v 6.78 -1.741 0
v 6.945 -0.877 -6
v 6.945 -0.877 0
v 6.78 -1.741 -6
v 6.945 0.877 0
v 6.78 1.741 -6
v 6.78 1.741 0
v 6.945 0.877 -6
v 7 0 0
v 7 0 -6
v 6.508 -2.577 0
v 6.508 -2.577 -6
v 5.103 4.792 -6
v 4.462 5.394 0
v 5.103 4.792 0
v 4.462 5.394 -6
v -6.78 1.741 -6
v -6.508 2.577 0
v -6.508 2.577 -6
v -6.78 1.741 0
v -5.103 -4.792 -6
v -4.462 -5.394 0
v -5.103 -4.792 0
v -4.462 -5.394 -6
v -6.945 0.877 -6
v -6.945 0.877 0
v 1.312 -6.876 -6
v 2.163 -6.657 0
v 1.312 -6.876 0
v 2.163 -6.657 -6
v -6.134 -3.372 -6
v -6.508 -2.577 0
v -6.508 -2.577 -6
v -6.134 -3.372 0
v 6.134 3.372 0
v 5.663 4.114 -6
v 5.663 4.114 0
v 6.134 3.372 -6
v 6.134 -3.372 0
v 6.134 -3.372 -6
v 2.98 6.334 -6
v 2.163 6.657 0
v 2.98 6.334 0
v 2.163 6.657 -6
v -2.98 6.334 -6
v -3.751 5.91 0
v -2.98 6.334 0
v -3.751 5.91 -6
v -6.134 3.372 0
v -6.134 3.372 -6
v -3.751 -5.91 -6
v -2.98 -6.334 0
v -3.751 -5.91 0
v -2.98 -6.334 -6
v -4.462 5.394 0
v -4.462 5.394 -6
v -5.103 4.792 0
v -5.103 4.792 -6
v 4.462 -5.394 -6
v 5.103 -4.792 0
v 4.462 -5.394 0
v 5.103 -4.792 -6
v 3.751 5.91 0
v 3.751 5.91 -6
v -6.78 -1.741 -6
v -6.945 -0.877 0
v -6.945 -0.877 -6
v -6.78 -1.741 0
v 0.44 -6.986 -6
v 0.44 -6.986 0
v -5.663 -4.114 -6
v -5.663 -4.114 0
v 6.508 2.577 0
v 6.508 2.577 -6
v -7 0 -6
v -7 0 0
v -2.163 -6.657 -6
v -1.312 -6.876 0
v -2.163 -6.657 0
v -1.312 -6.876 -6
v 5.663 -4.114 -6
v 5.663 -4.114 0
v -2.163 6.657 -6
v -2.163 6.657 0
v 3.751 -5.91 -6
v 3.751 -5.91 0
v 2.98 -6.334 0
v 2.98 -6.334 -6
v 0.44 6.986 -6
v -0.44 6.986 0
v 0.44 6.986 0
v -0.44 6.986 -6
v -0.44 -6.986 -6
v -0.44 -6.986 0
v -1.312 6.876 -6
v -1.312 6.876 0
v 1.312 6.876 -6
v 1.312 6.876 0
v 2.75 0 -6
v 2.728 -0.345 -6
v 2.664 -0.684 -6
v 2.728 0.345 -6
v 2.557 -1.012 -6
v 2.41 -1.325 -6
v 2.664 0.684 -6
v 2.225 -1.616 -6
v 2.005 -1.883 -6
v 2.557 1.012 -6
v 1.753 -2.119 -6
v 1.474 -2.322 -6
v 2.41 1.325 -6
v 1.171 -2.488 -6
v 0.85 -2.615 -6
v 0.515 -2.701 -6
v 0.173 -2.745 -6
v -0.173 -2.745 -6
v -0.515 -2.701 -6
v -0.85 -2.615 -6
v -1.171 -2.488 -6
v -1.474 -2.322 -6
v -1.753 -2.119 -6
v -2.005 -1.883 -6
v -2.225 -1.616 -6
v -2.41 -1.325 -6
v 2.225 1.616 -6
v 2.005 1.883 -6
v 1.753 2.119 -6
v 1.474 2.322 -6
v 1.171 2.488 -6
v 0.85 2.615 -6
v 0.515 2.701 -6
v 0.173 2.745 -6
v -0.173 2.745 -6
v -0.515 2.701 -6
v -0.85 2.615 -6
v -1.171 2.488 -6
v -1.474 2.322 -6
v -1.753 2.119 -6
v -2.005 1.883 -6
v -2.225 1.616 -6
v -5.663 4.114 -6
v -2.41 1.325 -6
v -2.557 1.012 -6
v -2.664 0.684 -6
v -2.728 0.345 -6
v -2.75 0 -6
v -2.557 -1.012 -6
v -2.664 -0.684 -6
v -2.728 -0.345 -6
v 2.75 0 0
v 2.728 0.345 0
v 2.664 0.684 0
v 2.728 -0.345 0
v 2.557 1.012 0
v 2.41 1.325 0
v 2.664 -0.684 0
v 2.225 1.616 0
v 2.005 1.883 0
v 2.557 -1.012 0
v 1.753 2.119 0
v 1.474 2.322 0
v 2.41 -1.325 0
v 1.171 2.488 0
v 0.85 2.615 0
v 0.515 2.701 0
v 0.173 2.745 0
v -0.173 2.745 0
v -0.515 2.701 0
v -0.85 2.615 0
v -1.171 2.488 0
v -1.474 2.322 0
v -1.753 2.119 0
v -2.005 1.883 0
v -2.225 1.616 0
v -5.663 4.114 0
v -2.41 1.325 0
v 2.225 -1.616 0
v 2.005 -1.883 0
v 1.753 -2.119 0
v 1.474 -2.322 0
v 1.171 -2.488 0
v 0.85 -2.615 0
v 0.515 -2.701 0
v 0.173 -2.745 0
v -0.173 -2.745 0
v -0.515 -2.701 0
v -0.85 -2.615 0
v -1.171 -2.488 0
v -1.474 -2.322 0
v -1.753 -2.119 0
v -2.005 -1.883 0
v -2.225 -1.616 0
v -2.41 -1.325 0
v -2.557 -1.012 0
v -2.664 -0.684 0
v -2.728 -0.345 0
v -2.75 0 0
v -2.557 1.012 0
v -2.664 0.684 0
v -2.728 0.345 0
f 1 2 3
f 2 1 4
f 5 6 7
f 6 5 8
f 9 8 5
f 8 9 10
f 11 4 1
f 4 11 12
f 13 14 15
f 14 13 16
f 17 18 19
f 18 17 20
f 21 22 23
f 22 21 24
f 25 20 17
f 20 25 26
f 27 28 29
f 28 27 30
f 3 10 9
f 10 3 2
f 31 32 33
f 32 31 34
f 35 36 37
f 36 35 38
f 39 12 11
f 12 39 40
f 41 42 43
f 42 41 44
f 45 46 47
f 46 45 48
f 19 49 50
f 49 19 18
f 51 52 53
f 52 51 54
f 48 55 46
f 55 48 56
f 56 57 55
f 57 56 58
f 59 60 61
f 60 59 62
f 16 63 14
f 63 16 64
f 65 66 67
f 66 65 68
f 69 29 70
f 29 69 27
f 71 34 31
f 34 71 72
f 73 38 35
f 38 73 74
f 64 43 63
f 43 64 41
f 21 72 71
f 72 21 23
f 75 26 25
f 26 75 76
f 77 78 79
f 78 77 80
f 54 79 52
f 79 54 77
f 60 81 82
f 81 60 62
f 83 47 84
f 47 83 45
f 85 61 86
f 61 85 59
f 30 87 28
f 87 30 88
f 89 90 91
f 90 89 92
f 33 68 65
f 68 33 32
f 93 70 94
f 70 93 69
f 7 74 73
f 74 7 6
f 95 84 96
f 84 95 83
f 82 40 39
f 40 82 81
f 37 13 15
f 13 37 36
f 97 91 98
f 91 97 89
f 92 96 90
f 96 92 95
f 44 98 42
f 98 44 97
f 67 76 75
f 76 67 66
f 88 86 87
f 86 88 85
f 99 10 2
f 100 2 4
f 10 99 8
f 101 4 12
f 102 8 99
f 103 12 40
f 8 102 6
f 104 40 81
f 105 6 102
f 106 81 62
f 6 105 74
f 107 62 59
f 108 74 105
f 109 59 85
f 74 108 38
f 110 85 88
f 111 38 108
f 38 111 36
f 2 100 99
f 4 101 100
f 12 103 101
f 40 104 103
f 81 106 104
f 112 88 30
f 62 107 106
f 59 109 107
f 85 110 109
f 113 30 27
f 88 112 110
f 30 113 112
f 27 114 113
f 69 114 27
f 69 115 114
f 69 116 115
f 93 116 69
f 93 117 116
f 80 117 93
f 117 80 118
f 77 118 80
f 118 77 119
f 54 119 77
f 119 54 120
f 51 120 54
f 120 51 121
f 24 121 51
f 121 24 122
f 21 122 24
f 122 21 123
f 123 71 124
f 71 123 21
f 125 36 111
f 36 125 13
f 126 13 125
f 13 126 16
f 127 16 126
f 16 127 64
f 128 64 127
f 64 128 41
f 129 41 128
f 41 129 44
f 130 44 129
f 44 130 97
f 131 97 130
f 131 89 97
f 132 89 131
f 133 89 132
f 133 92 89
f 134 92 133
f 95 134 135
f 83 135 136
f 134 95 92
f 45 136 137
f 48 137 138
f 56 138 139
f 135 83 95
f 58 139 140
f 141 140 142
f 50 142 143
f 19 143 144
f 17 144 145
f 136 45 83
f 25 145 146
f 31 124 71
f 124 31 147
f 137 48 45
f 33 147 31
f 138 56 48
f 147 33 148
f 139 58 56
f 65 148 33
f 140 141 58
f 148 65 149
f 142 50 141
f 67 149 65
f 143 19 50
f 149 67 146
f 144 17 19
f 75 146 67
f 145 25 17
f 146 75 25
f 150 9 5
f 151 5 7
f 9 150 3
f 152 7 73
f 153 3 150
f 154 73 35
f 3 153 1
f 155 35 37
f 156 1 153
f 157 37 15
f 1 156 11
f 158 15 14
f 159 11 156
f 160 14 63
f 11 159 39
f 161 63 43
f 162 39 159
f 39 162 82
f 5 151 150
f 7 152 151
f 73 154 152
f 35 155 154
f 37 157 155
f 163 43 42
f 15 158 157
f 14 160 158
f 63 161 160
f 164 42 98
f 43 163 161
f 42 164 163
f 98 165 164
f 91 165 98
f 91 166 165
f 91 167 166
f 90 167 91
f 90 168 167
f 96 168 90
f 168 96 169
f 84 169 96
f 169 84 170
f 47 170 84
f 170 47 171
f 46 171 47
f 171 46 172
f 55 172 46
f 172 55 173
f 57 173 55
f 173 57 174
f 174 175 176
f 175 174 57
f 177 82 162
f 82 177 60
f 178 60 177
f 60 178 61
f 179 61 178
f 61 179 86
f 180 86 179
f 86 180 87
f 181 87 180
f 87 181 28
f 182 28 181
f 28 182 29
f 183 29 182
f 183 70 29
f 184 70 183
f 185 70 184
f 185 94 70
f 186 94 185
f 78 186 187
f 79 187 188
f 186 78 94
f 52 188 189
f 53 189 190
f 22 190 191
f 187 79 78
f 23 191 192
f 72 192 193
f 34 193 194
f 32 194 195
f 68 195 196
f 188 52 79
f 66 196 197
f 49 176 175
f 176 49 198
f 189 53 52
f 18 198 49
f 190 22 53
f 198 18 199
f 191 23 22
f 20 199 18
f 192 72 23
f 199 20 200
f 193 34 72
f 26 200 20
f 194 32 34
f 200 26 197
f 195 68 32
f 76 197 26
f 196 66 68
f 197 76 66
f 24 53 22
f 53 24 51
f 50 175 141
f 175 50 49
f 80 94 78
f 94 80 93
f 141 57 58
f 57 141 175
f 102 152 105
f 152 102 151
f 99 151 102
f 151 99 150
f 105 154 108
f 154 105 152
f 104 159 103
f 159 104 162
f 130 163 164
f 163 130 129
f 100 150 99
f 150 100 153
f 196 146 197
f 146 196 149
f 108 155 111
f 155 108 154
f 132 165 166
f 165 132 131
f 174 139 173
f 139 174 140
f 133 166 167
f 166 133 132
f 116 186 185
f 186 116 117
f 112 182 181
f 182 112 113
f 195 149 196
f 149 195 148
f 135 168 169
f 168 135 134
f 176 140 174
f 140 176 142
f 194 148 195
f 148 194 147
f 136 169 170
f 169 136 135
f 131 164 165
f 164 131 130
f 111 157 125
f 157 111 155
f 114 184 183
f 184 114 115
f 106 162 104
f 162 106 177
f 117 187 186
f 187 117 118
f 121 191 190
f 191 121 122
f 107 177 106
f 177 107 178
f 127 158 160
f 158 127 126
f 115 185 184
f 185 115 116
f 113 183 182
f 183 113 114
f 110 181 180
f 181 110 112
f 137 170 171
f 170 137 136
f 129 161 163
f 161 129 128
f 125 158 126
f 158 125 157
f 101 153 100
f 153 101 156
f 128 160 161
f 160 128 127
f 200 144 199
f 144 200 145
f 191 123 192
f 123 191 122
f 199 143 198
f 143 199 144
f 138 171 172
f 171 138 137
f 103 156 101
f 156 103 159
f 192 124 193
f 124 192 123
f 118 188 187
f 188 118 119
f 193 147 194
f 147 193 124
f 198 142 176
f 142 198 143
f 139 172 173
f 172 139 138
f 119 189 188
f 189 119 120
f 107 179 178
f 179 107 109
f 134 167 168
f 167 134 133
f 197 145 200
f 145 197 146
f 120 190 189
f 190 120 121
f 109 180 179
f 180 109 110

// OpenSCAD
$fn = 50;


difference() {
	union() {
		translate(v = [0, 0, -6.0000000000]) {
			cylinder(h = 6, r = 7.0000000000);
		}
	}
	union() {
		#translate(v = [0, 0, -6]) {
			cylinder(h = 6, r = 2.7500000000);
		}
	}
}
